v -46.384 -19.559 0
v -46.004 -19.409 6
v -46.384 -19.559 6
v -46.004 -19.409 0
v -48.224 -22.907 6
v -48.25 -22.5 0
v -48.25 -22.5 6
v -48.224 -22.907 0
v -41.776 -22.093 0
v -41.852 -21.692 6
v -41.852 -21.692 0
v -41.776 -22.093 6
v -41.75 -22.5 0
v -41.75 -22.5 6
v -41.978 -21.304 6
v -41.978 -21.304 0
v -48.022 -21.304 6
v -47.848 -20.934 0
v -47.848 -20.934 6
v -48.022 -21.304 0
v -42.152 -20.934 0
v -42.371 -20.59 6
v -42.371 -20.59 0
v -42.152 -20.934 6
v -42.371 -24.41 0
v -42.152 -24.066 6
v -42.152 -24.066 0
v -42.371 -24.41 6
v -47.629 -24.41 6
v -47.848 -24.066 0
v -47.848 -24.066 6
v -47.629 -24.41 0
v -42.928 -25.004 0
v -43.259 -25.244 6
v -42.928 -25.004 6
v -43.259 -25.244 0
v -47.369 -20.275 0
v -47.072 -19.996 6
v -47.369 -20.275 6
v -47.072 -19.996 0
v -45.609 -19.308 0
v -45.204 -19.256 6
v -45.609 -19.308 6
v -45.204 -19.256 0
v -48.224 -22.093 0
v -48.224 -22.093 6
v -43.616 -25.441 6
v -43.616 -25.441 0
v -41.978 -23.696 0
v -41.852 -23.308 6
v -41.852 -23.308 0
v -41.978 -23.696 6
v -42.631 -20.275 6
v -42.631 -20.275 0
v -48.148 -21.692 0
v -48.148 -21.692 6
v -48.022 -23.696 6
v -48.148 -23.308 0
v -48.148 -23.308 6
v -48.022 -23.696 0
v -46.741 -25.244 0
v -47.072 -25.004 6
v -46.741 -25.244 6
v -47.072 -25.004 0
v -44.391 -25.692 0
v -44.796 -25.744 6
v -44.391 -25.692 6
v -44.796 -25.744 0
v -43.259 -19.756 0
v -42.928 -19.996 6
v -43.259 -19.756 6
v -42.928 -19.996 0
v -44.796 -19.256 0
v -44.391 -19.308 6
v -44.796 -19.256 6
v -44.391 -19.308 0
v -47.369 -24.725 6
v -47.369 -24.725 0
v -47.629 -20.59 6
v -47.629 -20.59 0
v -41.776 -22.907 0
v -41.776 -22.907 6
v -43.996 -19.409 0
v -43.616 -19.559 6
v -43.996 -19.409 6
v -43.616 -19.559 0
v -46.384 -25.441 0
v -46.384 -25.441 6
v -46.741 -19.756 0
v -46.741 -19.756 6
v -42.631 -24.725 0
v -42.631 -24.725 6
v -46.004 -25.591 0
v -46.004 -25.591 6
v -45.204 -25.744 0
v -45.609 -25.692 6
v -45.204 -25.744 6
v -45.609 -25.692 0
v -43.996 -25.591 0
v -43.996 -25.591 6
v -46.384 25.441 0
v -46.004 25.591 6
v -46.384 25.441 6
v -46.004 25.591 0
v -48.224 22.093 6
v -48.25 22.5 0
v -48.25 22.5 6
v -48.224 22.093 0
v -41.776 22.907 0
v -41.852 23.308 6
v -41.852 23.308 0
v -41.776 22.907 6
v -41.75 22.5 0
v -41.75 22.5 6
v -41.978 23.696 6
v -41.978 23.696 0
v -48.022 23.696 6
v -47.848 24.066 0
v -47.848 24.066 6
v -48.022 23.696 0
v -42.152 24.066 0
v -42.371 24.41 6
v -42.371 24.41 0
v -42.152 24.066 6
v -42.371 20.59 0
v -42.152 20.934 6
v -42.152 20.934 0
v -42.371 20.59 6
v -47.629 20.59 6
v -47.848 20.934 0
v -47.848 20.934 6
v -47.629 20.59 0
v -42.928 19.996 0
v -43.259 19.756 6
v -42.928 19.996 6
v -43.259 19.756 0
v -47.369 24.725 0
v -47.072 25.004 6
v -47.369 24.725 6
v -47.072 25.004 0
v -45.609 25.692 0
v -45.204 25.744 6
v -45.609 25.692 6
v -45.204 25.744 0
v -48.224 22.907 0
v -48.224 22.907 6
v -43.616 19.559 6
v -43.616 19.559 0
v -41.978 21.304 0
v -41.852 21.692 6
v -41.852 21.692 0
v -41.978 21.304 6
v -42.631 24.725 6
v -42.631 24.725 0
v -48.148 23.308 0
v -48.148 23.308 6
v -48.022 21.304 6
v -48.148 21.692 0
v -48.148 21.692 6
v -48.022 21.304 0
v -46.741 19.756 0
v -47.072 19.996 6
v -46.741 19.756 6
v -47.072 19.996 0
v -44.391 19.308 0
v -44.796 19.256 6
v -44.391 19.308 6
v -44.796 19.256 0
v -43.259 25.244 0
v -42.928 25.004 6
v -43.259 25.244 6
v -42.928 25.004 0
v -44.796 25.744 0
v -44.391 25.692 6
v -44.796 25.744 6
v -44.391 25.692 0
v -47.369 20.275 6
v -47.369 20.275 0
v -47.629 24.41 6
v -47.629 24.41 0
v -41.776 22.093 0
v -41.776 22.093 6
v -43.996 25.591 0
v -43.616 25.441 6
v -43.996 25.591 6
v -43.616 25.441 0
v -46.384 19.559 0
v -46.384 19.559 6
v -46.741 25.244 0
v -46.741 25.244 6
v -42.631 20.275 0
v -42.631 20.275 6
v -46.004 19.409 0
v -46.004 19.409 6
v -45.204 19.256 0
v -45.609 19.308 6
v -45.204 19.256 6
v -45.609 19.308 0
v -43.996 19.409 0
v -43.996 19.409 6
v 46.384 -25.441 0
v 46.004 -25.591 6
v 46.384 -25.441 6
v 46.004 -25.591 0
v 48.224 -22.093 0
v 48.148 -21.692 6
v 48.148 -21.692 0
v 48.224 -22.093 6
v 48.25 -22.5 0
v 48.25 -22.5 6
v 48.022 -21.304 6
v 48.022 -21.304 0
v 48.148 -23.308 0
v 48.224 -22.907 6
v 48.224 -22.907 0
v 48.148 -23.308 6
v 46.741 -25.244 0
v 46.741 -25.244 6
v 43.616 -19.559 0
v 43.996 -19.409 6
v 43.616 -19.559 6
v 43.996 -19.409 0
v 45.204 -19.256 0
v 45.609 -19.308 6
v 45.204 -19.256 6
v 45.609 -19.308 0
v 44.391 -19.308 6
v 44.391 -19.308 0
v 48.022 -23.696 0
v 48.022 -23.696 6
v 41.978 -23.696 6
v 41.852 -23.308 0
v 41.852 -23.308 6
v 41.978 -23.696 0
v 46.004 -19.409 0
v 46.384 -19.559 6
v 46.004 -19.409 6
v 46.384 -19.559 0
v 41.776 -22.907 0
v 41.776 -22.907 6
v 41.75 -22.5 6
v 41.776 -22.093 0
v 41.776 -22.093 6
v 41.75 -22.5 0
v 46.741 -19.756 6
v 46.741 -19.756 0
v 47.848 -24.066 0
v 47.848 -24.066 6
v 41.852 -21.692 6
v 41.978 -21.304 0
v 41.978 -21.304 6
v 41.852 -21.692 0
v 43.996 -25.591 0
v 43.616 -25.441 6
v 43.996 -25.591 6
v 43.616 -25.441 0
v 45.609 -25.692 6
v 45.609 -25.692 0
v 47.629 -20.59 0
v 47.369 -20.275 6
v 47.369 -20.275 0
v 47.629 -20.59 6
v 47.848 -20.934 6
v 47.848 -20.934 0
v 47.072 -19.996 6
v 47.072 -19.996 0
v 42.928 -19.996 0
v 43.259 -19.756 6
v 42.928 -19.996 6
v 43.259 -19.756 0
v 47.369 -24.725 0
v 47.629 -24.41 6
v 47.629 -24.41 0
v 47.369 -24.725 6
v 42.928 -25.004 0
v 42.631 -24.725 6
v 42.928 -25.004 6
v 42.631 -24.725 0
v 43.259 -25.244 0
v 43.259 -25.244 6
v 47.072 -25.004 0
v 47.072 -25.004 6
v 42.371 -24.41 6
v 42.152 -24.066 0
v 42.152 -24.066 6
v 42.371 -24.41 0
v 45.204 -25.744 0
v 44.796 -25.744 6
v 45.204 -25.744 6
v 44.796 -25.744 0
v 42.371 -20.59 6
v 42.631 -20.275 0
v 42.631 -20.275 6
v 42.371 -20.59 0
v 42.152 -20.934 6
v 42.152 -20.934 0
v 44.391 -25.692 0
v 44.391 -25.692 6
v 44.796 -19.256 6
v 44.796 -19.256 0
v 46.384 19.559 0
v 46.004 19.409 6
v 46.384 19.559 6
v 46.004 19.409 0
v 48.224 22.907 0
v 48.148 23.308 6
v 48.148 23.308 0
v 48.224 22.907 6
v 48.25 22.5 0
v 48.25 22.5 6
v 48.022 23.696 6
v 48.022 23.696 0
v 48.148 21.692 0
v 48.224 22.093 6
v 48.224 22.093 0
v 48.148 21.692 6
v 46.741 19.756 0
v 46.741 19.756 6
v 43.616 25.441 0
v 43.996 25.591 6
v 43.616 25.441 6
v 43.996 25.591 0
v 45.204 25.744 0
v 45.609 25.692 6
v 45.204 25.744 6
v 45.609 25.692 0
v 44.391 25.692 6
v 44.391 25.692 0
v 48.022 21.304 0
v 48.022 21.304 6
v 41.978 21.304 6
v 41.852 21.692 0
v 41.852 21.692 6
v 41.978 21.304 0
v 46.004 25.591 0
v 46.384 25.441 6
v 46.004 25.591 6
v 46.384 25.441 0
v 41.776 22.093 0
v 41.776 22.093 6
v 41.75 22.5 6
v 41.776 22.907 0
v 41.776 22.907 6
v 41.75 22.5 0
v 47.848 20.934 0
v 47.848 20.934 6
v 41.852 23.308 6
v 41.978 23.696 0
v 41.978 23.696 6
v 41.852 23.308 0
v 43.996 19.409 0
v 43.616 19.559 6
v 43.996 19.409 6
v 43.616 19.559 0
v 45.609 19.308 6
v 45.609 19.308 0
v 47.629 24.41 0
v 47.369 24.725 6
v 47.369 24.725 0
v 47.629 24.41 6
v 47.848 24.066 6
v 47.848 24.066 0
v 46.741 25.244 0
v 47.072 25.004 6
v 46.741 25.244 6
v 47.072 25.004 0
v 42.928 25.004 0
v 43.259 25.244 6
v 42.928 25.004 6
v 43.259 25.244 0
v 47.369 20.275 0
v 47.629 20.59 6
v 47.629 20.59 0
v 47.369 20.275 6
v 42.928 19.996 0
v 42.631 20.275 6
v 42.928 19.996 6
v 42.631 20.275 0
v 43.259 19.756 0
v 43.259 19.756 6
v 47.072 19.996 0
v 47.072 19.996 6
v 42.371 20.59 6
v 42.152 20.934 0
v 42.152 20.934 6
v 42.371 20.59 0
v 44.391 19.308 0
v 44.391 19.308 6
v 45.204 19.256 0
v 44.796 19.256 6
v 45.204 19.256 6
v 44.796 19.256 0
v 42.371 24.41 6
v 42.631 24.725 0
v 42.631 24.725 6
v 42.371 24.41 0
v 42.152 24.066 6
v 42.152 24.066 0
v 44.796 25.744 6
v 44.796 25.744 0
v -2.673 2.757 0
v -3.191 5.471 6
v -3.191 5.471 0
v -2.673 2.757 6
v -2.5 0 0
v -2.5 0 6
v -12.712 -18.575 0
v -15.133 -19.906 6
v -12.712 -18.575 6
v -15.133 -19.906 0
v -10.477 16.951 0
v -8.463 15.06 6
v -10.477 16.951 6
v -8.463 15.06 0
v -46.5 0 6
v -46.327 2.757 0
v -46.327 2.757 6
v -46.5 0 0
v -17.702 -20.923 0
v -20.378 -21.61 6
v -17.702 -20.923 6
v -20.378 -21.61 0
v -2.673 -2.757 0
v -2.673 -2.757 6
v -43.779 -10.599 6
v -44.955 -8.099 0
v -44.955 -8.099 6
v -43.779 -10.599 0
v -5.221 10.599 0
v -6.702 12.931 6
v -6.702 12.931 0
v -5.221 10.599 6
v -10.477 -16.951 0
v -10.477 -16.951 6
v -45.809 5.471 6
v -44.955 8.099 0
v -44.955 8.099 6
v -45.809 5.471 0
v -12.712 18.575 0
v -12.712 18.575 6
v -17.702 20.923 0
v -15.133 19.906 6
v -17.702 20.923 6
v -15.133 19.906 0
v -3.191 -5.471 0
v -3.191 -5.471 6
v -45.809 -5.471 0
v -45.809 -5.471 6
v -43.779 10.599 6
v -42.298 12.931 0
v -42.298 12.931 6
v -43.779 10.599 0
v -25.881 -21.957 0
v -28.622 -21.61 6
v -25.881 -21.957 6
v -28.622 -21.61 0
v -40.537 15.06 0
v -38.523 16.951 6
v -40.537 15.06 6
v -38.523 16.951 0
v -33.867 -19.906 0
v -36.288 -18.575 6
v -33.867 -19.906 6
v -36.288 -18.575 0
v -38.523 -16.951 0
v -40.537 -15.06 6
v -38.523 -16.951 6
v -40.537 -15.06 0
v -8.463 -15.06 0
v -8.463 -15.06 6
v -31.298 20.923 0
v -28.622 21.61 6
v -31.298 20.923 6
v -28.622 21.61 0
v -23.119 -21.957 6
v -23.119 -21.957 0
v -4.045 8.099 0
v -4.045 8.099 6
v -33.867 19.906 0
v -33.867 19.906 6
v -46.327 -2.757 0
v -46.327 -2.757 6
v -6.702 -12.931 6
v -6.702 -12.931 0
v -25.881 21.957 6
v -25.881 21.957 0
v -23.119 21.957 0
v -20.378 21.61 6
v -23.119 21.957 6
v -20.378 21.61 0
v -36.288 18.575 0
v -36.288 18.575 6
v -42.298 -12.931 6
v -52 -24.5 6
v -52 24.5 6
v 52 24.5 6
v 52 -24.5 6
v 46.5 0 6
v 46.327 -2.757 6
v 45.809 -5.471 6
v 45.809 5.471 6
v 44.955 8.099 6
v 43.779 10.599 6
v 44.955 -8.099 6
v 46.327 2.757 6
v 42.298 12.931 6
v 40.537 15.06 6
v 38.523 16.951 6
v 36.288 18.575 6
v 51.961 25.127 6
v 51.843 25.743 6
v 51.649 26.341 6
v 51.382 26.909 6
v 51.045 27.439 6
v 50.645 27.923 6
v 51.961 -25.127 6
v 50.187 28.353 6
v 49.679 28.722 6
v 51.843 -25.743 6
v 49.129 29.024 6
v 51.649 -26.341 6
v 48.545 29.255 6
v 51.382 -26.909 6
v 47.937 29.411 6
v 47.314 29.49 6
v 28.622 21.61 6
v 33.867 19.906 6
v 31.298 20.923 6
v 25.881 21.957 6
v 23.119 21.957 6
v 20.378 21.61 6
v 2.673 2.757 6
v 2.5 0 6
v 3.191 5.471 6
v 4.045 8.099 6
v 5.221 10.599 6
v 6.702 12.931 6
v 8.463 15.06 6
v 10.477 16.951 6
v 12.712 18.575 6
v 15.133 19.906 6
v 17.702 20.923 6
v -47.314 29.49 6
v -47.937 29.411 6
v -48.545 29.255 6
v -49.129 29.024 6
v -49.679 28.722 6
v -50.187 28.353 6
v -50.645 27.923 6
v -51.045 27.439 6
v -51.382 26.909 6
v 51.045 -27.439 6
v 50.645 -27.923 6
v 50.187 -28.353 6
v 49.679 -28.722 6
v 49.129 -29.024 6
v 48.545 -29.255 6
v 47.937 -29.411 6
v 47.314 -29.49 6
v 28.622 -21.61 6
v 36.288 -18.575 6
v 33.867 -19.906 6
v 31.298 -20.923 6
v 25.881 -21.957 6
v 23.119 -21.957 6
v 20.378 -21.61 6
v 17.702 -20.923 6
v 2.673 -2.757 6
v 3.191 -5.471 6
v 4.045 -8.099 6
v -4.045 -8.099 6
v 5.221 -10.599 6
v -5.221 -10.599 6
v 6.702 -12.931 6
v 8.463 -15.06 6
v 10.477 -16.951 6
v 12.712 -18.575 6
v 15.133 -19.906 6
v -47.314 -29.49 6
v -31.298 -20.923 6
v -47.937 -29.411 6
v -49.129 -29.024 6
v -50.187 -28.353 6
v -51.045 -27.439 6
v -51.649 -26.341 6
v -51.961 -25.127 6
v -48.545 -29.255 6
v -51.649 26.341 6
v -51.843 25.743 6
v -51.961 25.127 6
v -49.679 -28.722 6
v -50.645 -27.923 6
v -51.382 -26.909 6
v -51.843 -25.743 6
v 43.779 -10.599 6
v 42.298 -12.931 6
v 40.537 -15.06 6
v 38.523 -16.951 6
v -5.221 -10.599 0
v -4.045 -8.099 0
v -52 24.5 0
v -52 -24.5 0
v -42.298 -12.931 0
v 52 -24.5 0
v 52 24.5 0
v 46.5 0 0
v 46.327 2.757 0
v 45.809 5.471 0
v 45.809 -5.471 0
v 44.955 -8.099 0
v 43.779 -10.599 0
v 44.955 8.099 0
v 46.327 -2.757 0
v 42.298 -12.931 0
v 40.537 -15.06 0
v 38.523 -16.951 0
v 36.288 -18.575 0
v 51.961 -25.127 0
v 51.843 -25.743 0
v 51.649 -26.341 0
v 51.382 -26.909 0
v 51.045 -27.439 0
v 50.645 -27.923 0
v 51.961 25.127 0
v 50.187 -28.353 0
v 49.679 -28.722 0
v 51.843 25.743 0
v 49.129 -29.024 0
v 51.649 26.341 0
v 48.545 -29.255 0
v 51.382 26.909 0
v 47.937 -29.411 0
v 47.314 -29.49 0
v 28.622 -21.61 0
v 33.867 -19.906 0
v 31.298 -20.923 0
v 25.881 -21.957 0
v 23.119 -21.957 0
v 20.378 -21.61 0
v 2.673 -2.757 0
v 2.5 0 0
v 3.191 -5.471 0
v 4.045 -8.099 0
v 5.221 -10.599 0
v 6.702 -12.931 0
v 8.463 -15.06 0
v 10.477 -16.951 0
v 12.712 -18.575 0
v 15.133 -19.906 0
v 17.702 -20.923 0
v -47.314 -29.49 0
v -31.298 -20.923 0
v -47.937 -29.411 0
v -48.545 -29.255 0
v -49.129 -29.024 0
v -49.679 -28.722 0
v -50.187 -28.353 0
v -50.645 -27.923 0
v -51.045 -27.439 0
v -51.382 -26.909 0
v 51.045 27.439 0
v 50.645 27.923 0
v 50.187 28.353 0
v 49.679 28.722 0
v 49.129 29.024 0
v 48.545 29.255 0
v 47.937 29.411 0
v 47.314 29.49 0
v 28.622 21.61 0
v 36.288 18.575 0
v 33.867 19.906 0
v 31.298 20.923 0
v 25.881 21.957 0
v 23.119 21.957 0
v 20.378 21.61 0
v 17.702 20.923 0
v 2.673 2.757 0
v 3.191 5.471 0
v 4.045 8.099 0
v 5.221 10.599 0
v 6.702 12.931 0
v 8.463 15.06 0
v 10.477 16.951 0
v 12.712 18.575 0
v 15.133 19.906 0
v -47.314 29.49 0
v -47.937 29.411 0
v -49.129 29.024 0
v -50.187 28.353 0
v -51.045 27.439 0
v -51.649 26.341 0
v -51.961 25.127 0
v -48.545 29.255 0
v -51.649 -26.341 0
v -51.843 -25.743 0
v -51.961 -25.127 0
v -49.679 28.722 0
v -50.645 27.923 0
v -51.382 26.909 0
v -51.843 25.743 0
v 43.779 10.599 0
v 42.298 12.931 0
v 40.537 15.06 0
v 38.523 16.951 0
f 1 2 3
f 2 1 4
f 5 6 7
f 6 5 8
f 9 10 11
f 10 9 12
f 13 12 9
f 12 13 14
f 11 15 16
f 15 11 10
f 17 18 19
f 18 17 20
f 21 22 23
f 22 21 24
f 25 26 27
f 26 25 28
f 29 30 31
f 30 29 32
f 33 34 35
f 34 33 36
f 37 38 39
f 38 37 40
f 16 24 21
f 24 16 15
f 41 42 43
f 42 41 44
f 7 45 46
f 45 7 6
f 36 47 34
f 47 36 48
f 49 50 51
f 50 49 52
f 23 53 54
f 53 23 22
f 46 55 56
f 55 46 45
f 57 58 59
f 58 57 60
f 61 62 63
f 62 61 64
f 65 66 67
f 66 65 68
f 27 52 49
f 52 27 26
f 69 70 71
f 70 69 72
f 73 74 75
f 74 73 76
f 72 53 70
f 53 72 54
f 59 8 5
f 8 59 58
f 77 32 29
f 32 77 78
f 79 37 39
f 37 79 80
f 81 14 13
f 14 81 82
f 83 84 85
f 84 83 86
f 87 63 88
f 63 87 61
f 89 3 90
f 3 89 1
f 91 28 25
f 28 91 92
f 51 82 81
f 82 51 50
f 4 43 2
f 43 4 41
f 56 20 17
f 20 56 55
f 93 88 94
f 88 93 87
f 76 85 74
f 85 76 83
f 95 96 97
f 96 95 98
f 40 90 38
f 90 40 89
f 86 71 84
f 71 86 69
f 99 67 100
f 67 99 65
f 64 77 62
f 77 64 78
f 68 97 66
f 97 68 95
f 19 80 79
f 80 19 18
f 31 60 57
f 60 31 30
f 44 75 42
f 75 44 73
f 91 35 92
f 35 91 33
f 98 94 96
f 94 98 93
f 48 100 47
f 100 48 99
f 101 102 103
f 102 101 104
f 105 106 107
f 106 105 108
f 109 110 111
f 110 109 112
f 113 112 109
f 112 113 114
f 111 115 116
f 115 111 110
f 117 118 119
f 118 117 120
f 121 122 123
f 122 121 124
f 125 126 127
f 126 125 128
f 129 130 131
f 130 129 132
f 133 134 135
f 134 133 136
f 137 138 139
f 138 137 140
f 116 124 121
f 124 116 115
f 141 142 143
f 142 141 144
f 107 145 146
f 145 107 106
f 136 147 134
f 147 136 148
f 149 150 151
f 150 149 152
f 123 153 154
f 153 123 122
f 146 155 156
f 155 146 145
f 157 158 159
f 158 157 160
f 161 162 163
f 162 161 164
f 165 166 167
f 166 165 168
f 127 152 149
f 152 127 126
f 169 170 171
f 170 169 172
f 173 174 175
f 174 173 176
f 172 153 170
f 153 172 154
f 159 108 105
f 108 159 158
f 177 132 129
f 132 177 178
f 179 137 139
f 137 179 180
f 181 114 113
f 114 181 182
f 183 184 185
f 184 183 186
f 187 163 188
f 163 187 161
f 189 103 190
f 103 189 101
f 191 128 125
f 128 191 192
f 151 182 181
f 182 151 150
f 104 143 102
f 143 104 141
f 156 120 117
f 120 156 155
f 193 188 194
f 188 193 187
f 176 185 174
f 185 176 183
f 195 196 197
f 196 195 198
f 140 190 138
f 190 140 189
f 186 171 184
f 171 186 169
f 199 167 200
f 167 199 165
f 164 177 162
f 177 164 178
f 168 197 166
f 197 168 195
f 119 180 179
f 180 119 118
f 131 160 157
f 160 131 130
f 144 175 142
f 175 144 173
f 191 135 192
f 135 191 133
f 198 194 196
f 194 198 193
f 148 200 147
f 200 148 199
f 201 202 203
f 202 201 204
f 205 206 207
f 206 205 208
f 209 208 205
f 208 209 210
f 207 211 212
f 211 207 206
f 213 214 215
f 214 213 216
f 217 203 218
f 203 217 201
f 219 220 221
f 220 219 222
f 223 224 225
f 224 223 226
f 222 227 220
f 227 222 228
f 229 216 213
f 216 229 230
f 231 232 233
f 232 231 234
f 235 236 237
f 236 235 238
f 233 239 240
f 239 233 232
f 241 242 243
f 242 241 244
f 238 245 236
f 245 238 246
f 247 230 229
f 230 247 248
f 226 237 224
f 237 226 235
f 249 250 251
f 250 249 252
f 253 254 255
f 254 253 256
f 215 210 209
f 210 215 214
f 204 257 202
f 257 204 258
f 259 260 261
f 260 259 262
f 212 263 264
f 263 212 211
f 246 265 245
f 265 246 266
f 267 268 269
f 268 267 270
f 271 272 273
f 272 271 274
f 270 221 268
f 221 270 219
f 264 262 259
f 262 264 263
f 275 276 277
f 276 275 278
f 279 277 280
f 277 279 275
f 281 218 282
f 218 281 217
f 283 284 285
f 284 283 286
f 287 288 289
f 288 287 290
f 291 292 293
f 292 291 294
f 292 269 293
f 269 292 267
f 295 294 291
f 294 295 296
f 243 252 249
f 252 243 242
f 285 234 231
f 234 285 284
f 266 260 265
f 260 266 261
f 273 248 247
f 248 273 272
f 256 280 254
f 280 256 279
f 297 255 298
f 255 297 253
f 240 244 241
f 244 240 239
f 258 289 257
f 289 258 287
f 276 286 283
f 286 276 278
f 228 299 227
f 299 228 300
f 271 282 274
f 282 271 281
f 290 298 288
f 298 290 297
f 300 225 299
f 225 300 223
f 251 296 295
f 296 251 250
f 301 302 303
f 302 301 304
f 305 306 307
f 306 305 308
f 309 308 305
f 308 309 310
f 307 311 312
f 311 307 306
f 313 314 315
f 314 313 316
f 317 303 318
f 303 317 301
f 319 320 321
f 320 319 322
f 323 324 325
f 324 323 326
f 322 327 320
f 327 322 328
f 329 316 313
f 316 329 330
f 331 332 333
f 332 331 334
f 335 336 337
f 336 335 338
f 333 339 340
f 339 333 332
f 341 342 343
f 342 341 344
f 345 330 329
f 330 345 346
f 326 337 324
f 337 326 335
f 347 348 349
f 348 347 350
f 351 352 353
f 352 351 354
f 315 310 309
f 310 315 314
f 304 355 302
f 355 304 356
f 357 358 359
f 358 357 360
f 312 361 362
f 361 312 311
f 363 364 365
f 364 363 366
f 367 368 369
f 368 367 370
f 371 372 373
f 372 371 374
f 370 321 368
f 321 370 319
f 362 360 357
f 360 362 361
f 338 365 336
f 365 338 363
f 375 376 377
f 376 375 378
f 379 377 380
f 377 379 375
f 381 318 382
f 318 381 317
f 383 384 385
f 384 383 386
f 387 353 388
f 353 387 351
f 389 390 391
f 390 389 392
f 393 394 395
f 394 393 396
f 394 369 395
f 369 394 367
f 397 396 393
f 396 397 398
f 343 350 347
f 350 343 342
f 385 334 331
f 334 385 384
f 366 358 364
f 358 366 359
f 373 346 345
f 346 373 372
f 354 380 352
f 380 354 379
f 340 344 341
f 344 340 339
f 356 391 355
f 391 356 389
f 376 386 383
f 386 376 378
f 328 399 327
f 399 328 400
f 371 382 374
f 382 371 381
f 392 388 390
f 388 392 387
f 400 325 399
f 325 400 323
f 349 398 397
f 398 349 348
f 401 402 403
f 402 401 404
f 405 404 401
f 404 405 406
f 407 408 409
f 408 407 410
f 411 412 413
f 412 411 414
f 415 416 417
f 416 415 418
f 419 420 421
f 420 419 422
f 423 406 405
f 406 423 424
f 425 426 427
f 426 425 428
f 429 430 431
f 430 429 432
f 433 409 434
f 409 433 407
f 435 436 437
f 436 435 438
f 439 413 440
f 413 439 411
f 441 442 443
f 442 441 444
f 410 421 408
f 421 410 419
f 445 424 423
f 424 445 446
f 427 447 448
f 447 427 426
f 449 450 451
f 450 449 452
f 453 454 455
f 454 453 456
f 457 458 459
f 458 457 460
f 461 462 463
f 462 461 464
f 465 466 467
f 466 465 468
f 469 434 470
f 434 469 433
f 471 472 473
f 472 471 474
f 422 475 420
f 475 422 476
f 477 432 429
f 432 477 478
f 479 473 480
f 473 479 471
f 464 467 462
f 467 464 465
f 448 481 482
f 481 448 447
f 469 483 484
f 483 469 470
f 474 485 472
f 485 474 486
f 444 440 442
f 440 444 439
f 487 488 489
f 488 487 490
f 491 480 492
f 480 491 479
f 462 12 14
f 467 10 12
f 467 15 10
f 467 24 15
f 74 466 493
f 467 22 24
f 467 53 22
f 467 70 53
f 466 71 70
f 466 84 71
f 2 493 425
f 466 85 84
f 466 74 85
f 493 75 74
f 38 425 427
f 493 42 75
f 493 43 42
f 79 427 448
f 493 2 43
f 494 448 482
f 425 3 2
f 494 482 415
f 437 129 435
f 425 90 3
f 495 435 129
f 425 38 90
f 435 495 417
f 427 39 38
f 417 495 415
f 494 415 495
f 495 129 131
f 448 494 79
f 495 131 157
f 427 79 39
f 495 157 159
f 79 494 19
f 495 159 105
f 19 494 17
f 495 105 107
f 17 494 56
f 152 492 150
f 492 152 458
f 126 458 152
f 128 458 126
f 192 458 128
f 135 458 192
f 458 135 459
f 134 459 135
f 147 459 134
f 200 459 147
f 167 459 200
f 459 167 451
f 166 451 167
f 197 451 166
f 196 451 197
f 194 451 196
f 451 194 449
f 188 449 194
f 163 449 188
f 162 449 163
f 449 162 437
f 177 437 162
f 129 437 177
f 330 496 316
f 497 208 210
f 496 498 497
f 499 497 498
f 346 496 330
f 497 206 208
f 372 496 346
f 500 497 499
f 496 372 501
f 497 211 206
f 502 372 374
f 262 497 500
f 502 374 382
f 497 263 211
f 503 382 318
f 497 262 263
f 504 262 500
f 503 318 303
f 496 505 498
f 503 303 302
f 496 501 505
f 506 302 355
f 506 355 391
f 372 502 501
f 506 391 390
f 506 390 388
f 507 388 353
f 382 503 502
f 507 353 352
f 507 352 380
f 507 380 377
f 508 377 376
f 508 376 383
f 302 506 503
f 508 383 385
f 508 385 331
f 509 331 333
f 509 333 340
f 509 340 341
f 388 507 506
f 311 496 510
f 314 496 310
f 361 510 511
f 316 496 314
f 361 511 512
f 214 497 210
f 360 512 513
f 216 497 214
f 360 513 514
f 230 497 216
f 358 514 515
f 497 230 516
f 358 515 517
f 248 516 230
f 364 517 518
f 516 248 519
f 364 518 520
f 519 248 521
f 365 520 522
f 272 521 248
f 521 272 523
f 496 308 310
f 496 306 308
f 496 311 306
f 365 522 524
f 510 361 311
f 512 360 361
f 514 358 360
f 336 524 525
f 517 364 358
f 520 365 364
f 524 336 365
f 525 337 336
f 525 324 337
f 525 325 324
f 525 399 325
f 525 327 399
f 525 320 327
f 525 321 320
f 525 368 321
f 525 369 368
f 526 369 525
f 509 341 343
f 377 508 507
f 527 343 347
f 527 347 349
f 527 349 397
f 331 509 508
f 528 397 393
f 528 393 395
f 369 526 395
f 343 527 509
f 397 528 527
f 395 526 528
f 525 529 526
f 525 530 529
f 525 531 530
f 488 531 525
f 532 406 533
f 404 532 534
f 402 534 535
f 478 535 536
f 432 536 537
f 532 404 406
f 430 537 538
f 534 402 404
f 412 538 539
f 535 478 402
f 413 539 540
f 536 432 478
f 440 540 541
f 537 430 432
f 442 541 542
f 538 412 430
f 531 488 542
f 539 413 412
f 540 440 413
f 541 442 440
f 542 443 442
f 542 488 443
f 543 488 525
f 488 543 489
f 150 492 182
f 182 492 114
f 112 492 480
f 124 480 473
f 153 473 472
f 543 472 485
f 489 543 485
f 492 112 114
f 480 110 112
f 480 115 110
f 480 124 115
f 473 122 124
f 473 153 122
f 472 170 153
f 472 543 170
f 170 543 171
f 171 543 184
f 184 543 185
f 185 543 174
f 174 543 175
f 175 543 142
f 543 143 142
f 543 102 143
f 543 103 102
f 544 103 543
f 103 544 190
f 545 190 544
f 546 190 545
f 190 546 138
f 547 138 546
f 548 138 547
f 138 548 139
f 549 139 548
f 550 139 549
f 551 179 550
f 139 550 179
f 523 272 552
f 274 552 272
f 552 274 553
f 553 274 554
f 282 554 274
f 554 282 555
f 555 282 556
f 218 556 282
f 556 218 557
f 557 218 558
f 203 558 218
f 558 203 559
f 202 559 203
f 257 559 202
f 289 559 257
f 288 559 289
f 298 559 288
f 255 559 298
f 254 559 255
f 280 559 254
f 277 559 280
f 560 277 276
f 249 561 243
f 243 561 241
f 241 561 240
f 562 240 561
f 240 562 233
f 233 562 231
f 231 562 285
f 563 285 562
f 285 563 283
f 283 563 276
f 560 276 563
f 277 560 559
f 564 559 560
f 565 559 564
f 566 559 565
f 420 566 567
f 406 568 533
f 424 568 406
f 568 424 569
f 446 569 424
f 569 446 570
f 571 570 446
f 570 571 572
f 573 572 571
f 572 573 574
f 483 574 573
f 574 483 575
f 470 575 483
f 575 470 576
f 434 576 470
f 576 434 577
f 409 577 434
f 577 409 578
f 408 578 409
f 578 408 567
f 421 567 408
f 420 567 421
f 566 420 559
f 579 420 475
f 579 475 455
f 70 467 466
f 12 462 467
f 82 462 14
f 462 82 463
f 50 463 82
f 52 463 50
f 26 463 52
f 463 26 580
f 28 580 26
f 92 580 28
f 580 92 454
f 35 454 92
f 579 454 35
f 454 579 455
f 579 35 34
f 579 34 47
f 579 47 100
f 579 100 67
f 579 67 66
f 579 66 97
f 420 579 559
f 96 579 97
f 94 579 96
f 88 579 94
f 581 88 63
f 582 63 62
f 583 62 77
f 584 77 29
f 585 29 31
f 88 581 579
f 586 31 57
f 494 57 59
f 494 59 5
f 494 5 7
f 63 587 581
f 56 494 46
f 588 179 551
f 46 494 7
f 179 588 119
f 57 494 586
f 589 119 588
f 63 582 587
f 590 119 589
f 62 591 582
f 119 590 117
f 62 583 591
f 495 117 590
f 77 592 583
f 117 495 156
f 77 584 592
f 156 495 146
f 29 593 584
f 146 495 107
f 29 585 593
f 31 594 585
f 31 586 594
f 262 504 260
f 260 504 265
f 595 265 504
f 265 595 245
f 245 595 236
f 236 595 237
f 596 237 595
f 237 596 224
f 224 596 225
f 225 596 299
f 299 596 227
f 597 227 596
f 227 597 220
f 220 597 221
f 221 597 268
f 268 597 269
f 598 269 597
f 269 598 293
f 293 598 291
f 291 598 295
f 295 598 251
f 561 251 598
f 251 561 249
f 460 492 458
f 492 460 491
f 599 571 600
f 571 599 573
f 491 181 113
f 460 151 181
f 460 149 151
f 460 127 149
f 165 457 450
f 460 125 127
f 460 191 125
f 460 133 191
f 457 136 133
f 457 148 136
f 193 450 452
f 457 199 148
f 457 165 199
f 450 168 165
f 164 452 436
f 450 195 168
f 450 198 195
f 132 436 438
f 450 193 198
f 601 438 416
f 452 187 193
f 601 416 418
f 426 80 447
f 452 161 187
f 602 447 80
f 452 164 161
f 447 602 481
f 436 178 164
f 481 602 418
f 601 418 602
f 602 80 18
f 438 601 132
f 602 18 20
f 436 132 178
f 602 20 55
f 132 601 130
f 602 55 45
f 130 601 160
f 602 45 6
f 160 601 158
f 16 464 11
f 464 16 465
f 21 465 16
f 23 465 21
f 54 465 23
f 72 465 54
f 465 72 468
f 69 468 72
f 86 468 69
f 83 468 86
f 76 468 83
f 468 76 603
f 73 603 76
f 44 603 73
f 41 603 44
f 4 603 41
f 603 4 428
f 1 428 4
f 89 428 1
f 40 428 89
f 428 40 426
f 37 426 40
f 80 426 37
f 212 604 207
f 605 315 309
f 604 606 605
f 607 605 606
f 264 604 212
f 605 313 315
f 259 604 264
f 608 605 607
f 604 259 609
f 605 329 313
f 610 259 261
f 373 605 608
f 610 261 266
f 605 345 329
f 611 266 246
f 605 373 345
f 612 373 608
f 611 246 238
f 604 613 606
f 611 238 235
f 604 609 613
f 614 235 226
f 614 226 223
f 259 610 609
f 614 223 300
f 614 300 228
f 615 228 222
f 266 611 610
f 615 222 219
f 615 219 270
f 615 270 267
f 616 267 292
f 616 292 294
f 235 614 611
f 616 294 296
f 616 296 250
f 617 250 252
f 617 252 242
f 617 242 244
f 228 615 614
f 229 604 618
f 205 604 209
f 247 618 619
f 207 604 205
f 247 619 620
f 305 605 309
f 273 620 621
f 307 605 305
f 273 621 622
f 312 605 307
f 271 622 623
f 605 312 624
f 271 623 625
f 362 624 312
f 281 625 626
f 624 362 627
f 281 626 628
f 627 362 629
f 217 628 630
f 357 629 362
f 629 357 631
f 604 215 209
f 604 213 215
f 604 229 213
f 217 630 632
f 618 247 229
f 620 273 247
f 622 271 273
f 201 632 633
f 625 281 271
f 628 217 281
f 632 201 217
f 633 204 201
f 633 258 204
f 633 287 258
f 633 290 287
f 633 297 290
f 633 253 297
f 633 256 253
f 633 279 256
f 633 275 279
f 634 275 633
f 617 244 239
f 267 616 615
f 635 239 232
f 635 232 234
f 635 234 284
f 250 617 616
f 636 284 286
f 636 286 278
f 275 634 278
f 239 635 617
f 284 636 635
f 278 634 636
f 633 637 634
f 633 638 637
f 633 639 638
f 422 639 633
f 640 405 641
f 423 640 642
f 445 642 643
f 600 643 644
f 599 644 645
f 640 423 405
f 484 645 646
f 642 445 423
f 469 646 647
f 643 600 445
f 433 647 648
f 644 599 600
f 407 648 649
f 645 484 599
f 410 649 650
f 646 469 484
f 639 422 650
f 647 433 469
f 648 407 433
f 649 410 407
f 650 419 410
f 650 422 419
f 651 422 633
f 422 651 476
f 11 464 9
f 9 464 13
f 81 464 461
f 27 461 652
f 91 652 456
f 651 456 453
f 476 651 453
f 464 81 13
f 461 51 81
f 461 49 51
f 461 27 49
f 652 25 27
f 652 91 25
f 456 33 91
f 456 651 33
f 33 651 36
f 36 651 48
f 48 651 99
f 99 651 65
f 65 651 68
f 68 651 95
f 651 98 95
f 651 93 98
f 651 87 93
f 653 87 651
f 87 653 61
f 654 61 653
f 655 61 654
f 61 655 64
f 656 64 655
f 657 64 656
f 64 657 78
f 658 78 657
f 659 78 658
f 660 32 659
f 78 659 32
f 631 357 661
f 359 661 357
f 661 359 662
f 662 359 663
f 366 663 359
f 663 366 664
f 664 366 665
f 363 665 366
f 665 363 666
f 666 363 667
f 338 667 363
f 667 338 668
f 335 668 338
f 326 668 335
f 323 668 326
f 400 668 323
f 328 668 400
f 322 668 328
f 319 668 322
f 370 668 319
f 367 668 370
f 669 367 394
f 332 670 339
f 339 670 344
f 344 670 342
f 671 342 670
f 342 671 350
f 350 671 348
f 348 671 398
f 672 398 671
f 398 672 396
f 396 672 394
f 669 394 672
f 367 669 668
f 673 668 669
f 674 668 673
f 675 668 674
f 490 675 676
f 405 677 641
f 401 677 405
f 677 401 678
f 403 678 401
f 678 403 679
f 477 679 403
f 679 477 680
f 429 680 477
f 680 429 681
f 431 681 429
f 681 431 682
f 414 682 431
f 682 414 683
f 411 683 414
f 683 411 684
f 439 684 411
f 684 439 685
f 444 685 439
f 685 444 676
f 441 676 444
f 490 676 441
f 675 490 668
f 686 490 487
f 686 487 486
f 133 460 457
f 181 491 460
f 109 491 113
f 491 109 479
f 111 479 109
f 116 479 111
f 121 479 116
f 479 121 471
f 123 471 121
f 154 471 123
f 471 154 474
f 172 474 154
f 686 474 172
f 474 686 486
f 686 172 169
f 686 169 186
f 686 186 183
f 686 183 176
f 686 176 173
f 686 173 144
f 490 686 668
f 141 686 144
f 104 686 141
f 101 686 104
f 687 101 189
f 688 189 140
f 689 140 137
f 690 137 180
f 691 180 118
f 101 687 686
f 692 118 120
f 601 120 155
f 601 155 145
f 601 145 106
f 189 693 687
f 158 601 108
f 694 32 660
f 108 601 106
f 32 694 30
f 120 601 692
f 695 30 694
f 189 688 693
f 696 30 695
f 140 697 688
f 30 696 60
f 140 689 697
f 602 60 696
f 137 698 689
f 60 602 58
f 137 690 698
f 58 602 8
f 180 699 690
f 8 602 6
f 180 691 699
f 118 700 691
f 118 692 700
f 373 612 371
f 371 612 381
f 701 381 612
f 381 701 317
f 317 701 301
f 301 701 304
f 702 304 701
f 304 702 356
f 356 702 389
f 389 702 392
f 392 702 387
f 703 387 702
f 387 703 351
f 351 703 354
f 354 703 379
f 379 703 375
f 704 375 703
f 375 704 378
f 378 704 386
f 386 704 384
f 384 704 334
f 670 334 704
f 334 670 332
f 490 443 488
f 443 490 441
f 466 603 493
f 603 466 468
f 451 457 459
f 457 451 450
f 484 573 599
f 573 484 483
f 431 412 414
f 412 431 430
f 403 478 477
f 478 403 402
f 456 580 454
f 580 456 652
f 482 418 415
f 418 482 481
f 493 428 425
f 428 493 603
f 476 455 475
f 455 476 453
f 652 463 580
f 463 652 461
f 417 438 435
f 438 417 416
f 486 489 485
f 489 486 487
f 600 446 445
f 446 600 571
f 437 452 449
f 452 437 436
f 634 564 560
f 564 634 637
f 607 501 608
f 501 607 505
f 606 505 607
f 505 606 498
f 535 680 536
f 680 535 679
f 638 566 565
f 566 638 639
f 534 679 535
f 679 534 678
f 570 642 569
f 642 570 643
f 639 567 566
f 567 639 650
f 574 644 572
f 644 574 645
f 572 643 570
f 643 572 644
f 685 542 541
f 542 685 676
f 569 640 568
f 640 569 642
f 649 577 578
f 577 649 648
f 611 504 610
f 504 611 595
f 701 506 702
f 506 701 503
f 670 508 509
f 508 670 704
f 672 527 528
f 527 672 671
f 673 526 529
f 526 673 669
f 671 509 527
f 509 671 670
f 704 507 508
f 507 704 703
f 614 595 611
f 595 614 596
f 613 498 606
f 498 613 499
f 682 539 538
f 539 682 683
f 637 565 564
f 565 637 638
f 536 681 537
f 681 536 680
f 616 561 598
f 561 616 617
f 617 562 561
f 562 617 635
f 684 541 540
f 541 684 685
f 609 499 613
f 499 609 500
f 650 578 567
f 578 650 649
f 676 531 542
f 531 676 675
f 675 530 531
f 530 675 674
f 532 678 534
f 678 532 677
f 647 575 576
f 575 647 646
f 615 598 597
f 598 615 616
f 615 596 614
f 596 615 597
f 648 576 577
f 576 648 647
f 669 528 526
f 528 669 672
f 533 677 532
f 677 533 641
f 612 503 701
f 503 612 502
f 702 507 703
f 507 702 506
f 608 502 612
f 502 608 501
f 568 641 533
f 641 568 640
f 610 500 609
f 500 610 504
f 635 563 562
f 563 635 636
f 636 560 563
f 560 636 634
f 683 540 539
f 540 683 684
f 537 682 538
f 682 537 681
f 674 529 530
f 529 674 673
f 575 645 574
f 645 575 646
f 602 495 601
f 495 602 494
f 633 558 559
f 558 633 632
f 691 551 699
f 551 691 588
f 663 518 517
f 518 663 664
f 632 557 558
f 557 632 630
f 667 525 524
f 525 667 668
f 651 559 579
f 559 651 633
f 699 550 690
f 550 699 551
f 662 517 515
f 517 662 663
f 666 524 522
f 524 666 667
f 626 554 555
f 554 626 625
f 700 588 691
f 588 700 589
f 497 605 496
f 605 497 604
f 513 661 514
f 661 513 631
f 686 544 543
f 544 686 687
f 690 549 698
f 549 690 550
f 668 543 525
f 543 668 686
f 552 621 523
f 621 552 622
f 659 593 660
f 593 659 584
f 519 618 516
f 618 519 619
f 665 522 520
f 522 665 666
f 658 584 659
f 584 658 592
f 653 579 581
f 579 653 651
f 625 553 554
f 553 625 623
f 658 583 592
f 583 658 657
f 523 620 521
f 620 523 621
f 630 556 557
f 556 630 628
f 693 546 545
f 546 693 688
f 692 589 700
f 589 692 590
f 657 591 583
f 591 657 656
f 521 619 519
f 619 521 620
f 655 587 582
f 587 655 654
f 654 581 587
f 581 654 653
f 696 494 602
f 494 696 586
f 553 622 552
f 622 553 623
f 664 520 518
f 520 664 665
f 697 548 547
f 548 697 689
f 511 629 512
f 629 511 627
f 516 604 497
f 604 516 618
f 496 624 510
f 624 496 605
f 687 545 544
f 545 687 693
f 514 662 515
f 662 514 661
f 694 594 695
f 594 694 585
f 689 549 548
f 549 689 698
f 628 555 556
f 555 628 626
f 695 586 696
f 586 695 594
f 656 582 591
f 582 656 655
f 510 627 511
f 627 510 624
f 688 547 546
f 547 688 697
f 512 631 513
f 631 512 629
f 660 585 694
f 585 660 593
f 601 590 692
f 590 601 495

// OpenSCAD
$fn = 50;


difference() {
	union() {
		hull() {
			translate(v = [-47.0000000000, 24.5000000000, 0]) {
				cylinder(h = 6, r = 5);
			}
			translate(v = [47.0000000000, 24.5000000000, 0]) {
				cylinder(h = 6, r = 5);
			}
			translate(v = [-47.0000000000, -24.5000000000, 0]) {
				cylinder(h = 6, r = 5);
			}
			translate(v = [47.0000000000, -24.5000000000, 0]) {
				cylinder(h = 6, r = 5);
			}
		}
	}
	union() {
		#translate(v = [-45.0000000000, -22.5000000000, -100.0000000000]) {
			cylinder(h = 200, r = 3.2500000000);
		}
		#translate(v = [-45.0000000000, 22.5000000000, -100.0000000000]) {
			cylinder(h = 200, r = 3.2500000000);
		}
		#translate(v = [45.0000000000, -22.5000000000, -100.0000000000]) {
			cylinder(h = 200, r = 3.2500000000);
		}
		#translate(v = [45.0000000000, 22.5000000000, -100.0000000000]) {
			cylinder(h = 200, r = 3.2500000000);
		}
		#translate(v = [-24.5000000000, 0, 0]) {
			cylinder(h = 6, r = 22.0000000000);
		}
		#translate(v = [24.5000000000, 0, 0]) {
			cylinder(h = 6, r = 22.0000000000);
		}
	}
}
